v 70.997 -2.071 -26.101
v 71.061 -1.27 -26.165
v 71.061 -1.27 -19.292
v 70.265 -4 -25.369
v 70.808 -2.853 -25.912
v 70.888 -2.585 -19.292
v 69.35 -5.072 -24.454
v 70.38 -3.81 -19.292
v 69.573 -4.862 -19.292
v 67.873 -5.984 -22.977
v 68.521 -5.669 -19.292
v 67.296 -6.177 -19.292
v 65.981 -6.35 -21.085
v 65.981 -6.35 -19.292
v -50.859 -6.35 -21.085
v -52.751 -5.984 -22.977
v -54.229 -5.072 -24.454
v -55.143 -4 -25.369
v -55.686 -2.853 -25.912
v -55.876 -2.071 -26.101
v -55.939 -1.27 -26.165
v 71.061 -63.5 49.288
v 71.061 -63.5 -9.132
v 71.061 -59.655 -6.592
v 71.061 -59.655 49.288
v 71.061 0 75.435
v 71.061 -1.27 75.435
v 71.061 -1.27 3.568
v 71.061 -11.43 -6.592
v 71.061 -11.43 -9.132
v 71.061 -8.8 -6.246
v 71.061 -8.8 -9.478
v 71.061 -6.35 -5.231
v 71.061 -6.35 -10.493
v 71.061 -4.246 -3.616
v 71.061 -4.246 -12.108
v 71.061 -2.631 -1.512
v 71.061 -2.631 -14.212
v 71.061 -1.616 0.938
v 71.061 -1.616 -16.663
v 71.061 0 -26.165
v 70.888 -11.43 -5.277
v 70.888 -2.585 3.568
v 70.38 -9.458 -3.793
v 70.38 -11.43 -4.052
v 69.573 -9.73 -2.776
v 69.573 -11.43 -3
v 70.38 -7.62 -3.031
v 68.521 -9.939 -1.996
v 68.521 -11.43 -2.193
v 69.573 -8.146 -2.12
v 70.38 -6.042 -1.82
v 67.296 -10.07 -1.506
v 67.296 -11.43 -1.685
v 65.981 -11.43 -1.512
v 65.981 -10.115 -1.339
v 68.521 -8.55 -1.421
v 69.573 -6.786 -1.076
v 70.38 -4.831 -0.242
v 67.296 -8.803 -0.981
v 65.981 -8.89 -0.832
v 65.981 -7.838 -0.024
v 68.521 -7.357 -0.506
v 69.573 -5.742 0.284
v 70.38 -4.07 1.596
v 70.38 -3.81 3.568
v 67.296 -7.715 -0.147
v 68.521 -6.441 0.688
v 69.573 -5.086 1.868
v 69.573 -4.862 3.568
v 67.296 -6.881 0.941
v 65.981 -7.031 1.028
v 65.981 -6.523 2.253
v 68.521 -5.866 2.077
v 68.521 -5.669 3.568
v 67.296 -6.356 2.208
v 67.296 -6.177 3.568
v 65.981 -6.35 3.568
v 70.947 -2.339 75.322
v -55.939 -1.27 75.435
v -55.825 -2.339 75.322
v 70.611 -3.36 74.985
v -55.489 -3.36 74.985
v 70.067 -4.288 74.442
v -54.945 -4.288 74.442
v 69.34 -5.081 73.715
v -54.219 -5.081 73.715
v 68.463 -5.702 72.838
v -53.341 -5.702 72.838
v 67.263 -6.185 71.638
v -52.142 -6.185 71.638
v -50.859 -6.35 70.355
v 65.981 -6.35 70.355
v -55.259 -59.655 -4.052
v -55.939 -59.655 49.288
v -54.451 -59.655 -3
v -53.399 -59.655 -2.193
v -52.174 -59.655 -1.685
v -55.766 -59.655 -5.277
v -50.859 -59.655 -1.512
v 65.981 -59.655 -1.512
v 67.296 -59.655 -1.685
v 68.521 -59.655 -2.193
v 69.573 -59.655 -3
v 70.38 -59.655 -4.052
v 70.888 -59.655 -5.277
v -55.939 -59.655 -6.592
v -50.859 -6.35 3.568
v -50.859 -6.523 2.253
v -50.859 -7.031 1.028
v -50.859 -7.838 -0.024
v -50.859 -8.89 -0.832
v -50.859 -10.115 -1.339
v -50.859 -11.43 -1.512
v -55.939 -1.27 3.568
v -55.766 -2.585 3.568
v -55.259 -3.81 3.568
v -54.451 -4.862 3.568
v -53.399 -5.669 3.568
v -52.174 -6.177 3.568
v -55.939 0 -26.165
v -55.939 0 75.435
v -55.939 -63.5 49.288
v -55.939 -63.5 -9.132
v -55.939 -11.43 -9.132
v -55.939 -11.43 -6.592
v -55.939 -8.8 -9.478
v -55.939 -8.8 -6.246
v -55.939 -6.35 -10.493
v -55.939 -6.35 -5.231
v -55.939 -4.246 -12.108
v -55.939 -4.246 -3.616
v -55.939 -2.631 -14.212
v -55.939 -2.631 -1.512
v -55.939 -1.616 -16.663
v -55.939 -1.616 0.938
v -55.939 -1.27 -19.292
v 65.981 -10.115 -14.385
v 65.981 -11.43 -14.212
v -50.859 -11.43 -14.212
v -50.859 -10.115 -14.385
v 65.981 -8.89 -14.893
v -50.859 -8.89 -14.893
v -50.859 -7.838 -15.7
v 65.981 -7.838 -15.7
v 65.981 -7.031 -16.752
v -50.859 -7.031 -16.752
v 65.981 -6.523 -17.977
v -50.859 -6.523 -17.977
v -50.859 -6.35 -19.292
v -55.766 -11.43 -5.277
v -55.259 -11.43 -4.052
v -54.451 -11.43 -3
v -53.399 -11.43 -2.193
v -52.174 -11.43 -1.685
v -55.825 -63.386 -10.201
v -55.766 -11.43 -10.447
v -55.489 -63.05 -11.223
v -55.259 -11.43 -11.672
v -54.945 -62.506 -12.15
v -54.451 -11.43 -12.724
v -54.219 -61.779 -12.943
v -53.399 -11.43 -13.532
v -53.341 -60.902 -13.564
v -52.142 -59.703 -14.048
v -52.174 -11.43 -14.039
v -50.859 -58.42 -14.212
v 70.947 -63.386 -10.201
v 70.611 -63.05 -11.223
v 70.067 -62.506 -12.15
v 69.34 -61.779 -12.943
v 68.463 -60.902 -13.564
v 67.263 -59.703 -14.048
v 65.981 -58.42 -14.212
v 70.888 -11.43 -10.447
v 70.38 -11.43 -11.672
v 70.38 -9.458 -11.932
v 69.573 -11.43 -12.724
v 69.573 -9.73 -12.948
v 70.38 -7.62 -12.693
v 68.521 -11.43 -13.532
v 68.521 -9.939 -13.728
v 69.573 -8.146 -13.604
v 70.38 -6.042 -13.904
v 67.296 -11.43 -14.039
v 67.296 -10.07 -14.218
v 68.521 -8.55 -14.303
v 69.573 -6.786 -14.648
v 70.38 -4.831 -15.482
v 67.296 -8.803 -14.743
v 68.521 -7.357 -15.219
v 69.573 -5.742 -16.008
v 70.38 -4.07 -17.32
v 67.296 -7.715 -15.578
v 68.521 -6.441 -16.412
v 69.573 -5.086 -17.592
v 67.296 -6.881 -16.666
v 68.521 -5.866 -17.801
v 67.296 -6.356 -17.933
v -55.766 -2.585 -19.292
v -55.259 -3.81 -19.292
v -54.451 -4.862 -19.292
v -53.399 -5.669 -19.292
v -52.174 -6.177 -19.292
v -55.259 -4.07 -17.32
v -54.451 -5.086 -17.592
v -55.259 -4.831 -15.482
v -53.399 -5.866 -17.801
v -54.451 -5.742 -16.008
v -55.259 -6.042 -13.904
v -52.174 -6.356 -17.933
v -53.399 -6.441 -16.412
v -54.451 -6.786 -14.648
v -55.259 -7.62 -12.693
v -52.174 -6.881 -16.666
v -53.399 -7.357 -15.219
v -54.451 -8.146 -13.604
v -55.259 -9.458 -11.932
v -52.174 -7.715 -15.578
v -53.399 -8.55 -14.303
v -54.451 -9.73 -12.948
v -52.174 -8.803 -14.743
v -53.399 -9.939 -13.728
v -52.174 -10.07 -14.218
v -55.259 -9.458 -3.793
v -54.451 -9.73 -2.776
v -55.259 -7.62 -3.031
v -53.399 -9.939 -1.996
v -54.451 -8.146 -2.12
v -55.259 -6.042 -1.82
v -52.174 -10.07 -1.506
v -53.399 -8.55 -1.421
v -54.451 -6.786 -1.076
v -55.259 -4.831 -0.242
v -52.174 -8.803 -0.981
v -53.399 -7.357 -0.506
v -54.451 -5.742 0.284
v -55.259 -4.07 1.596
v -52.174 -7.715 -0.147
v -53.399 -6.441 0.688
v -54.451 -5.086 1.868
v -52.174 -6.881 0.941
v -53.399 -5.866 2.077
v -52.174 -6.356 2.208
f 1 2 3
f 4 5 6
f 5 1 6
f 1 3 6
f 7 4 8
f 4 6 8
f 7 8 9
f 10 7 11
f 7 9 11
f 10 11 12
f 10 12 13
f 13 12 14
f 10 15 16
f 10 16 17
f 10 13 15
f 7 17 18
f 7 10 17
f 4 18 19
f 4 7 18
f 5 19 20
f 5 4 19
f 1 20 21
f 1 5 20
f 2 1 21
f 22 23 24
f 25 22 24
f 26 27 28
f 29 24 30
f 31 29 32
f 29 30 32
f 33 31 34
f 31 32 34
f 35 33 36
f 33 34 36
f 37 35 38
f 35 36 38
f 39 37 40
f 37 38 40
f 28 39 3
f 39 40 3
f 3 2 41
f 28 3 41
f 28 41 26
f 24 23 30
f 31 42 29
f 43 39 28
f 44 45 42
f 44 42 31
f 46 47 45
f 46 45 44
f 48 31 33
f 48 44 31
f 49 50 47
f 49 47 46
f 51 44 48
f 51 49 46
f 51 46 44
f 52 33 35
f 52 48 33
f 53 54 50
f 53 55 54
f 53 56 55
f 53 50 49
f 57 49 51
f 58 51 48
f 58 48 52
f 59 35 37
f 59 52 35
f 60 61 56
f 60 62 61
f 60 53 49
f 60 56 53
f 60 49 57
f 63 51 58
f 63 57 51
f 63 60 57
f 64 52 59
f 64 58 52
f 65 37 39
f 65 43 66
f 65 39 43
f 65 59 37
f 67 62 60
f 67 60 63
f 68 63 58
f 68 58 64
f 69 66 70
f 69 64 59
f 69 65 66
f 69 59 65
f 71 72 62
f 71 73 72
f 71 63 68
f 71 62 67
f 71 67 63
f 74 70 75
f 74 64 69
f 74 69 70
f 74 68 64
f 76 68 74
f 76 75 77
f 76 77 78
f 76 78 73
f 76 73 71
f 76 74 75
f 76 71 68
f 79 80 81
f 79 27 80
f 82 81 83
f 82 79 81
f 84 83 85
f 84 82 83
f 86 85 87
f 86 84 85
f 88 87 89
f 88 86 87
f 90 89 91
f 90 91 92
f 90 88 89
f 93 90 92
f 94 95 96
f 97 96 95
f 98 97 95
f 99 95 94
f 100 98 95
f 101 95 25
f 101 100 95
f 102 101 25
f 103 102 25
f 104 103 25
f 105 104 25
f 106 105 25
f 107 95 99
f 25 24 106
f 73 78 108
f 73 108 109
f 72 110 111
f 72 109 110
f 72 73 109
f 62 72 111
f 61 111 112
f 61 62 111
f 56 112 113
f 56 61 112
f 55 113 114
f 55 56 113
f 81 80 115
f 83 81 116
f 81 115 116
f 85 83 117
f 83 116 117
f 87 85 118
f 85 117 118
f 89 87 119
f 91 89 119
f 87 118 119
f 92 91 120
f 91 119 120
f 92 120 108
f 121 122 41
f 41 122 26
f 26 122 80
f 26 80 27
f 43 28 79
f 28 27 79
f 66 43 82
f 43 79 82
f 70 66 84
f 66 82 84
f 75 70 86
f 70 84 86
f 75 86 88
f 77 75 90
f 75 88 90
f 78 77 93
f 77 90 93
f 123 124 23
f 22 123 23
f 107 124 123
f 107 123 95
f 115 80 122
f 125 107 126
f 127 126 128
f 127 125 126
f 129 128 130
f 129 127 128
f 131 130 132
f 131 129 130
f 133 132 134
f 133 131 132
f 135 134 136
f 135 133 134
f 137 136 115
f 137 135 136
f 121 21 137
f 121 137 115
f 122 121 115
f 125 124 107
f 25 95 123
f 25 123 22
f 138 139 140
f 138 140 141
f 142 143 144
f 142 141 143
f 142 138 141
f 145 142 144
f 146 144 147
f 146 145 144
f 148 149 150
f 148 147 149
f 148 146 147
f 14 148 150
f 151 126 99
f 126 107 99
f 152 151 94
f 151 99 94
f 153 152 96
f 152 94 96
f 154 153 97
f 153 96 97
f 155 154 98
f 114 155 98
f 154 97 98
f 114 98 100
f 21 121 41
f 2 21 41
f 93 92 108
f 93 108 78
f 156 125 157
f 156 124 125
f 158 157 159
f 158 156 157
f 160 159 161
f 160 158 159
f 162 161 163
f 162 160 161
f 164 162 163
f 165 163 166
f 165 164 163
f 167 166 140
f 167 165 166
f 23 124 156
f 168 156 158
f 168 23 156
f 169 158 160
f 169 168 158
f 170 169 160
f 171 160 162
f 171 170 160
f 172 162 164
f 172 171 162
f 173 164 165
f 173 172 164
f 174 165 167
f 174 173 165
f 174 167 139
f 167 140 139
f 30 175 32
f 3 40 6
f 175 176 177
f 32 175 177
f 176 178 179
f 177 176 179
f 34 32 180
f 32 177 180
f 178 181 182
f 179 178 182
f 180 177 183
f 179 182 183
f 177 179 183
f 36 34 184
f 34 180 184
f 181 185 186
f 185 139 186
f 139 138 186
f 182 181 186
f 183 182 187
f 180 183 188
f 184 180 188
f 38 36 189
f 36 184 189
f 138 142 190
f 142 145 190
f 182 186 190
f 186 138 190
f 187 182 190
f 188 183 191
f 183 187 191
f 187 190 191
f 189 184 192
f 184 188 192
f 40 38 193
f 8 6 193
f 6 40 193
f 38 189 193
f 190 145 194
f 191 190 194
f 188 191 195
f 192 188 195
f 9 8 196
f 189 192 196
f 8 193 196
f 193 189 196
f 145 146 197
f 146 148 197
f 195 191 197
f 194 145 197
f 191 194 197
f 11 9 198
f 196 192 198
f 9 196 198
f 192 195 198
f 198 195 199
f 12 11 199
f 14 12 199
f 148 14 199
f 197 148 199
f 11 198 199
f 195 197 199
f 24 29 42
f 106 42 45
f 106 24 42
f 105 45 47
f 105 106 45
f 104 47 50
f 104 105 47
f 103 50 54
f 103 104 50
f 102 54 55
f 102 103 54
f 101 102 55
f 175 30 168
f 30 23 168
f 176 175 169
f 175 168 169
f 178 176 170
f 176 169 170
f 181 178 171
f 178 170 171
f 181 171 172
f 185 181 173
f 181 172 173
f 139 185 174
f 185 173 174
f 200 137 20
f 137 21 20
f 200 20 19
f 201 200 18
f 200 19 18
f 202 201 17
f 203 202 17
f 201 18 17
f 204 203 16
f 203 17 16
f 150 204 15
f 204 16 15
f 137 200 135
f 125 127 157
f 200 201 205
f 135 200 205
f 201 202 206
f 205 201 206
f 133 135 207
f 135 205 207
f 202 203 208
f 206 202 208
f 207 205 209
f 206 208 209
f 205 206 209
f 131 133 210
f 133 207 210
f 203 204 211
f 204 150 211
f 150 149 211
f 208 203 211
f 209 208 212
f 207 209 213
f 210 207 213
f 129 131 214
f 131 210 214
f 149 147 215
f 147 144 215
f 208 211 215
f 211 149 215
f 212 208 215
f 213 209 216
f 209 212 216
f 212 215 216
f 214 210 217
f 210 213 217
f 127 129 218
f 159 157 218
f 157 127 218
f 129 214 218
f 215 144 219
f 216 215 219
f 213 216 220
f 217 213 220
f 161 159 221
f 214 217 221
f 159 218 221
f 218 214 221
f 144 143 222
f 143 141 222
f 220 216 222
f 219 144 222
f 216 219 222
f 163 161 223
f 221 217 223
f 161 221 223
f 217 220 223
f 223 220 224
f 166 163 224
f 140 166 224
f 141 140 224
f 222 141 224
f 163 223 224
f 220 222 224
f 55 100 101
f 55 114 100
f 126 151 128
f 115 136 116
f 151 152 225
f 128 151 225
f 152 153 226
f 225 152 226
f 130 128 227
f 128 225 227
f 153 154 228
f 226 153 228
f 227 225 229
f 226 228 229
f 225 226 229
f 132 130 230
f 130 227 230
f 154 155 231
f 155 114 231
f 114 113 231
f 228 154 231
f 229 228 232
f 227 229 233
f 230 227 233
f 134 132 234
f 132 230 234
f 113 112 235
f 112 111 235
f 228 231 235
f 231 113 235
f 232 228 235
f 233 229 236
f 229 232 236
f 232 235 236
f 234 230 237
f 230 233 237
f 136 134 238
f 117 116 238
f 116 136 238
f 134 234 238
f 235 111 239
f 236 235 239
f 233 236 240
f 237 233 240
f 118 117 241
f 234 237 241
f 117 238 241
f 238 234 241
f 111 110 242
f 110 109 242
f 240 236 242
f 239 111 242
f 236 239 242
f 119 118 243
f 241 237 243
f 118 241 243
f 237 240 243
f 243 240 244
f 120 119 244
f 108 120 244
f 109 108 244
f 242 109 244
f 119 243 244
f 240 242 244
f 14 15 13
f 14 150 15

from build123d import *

# Parameters (mm, degrees)
F0_W     = 127
F0_H     = 12.7
F1_DEPTH = 63.5
F0_H_2   = 76.9474954844
F0_H_3   = 11.9525045156
F2_DEPTH = 6.35
F3_W     = 127
F3_H     = 3.8452798724
F4_DEPTH = 50.8
F5_R     = 5.08


with BuildPart() as f1:
    # F0 (on Front) → F1 (new body)
    with BuildSketch(Plane.XZ):
        with Locations((7.5608139634, -7.8621631652)):
            Rectangle(F0_W, F0_H)
    extrude(amount=F1_DEPTH)

    # F0 (on Front) → F2 (join)
    with BuildSketch(Plane.XZ):
        with Locations((7.5608139634, 36.961584577)):
            Rectangle(F0_W, F0_H_2)
        with Locations((7.5608139634, -20.188415423)):
            Rectangle(F0_W, F0_H_3)
        with Locations((7.5608139634, -7.8621631652)):
            Rectangle(F0_W, F0_H)
    extrude(amount=F2_DEPTH)

    # F3 (on face) → F4 (join)
    with BuildSketch(Plane.XY.offset(-1.5121631652)):
        with Locations((7.5608139634, -61.5773600638)):
            Rectangle(F3_W, F3_H)
    extrude(amount=F4_DEPTH)

    # F5
    f5_edges = [f1.edges().sort_by_distance(p)[0] for p in [
        (7.560814, -63.5, -14.212163),
        (71.060814, -34.925, -14.212163),
        (7.560814, -6.35, -26.164668),
        (-55.939186, -6.35, -20.188415),
        (-55.939186, -34.925, -14.212163),
        (71.060814, -6.35, -20.188415),
        (7.560814, -6.35, -14.212163),
        (-55.939186, -6.35, 36.961585),
        (7.560814, -6.35, -1.512163),
        (7.560814, -6.35, 75.435332),
        (71.060814, -33.00236, -1.512163),
        (71.060814, -6.35, 36.961585),
        (-55.939186, -33.00236, -1.512163),
    ]]
    fillet(f5_edges, radius=F5_R)


solid = f1.part
